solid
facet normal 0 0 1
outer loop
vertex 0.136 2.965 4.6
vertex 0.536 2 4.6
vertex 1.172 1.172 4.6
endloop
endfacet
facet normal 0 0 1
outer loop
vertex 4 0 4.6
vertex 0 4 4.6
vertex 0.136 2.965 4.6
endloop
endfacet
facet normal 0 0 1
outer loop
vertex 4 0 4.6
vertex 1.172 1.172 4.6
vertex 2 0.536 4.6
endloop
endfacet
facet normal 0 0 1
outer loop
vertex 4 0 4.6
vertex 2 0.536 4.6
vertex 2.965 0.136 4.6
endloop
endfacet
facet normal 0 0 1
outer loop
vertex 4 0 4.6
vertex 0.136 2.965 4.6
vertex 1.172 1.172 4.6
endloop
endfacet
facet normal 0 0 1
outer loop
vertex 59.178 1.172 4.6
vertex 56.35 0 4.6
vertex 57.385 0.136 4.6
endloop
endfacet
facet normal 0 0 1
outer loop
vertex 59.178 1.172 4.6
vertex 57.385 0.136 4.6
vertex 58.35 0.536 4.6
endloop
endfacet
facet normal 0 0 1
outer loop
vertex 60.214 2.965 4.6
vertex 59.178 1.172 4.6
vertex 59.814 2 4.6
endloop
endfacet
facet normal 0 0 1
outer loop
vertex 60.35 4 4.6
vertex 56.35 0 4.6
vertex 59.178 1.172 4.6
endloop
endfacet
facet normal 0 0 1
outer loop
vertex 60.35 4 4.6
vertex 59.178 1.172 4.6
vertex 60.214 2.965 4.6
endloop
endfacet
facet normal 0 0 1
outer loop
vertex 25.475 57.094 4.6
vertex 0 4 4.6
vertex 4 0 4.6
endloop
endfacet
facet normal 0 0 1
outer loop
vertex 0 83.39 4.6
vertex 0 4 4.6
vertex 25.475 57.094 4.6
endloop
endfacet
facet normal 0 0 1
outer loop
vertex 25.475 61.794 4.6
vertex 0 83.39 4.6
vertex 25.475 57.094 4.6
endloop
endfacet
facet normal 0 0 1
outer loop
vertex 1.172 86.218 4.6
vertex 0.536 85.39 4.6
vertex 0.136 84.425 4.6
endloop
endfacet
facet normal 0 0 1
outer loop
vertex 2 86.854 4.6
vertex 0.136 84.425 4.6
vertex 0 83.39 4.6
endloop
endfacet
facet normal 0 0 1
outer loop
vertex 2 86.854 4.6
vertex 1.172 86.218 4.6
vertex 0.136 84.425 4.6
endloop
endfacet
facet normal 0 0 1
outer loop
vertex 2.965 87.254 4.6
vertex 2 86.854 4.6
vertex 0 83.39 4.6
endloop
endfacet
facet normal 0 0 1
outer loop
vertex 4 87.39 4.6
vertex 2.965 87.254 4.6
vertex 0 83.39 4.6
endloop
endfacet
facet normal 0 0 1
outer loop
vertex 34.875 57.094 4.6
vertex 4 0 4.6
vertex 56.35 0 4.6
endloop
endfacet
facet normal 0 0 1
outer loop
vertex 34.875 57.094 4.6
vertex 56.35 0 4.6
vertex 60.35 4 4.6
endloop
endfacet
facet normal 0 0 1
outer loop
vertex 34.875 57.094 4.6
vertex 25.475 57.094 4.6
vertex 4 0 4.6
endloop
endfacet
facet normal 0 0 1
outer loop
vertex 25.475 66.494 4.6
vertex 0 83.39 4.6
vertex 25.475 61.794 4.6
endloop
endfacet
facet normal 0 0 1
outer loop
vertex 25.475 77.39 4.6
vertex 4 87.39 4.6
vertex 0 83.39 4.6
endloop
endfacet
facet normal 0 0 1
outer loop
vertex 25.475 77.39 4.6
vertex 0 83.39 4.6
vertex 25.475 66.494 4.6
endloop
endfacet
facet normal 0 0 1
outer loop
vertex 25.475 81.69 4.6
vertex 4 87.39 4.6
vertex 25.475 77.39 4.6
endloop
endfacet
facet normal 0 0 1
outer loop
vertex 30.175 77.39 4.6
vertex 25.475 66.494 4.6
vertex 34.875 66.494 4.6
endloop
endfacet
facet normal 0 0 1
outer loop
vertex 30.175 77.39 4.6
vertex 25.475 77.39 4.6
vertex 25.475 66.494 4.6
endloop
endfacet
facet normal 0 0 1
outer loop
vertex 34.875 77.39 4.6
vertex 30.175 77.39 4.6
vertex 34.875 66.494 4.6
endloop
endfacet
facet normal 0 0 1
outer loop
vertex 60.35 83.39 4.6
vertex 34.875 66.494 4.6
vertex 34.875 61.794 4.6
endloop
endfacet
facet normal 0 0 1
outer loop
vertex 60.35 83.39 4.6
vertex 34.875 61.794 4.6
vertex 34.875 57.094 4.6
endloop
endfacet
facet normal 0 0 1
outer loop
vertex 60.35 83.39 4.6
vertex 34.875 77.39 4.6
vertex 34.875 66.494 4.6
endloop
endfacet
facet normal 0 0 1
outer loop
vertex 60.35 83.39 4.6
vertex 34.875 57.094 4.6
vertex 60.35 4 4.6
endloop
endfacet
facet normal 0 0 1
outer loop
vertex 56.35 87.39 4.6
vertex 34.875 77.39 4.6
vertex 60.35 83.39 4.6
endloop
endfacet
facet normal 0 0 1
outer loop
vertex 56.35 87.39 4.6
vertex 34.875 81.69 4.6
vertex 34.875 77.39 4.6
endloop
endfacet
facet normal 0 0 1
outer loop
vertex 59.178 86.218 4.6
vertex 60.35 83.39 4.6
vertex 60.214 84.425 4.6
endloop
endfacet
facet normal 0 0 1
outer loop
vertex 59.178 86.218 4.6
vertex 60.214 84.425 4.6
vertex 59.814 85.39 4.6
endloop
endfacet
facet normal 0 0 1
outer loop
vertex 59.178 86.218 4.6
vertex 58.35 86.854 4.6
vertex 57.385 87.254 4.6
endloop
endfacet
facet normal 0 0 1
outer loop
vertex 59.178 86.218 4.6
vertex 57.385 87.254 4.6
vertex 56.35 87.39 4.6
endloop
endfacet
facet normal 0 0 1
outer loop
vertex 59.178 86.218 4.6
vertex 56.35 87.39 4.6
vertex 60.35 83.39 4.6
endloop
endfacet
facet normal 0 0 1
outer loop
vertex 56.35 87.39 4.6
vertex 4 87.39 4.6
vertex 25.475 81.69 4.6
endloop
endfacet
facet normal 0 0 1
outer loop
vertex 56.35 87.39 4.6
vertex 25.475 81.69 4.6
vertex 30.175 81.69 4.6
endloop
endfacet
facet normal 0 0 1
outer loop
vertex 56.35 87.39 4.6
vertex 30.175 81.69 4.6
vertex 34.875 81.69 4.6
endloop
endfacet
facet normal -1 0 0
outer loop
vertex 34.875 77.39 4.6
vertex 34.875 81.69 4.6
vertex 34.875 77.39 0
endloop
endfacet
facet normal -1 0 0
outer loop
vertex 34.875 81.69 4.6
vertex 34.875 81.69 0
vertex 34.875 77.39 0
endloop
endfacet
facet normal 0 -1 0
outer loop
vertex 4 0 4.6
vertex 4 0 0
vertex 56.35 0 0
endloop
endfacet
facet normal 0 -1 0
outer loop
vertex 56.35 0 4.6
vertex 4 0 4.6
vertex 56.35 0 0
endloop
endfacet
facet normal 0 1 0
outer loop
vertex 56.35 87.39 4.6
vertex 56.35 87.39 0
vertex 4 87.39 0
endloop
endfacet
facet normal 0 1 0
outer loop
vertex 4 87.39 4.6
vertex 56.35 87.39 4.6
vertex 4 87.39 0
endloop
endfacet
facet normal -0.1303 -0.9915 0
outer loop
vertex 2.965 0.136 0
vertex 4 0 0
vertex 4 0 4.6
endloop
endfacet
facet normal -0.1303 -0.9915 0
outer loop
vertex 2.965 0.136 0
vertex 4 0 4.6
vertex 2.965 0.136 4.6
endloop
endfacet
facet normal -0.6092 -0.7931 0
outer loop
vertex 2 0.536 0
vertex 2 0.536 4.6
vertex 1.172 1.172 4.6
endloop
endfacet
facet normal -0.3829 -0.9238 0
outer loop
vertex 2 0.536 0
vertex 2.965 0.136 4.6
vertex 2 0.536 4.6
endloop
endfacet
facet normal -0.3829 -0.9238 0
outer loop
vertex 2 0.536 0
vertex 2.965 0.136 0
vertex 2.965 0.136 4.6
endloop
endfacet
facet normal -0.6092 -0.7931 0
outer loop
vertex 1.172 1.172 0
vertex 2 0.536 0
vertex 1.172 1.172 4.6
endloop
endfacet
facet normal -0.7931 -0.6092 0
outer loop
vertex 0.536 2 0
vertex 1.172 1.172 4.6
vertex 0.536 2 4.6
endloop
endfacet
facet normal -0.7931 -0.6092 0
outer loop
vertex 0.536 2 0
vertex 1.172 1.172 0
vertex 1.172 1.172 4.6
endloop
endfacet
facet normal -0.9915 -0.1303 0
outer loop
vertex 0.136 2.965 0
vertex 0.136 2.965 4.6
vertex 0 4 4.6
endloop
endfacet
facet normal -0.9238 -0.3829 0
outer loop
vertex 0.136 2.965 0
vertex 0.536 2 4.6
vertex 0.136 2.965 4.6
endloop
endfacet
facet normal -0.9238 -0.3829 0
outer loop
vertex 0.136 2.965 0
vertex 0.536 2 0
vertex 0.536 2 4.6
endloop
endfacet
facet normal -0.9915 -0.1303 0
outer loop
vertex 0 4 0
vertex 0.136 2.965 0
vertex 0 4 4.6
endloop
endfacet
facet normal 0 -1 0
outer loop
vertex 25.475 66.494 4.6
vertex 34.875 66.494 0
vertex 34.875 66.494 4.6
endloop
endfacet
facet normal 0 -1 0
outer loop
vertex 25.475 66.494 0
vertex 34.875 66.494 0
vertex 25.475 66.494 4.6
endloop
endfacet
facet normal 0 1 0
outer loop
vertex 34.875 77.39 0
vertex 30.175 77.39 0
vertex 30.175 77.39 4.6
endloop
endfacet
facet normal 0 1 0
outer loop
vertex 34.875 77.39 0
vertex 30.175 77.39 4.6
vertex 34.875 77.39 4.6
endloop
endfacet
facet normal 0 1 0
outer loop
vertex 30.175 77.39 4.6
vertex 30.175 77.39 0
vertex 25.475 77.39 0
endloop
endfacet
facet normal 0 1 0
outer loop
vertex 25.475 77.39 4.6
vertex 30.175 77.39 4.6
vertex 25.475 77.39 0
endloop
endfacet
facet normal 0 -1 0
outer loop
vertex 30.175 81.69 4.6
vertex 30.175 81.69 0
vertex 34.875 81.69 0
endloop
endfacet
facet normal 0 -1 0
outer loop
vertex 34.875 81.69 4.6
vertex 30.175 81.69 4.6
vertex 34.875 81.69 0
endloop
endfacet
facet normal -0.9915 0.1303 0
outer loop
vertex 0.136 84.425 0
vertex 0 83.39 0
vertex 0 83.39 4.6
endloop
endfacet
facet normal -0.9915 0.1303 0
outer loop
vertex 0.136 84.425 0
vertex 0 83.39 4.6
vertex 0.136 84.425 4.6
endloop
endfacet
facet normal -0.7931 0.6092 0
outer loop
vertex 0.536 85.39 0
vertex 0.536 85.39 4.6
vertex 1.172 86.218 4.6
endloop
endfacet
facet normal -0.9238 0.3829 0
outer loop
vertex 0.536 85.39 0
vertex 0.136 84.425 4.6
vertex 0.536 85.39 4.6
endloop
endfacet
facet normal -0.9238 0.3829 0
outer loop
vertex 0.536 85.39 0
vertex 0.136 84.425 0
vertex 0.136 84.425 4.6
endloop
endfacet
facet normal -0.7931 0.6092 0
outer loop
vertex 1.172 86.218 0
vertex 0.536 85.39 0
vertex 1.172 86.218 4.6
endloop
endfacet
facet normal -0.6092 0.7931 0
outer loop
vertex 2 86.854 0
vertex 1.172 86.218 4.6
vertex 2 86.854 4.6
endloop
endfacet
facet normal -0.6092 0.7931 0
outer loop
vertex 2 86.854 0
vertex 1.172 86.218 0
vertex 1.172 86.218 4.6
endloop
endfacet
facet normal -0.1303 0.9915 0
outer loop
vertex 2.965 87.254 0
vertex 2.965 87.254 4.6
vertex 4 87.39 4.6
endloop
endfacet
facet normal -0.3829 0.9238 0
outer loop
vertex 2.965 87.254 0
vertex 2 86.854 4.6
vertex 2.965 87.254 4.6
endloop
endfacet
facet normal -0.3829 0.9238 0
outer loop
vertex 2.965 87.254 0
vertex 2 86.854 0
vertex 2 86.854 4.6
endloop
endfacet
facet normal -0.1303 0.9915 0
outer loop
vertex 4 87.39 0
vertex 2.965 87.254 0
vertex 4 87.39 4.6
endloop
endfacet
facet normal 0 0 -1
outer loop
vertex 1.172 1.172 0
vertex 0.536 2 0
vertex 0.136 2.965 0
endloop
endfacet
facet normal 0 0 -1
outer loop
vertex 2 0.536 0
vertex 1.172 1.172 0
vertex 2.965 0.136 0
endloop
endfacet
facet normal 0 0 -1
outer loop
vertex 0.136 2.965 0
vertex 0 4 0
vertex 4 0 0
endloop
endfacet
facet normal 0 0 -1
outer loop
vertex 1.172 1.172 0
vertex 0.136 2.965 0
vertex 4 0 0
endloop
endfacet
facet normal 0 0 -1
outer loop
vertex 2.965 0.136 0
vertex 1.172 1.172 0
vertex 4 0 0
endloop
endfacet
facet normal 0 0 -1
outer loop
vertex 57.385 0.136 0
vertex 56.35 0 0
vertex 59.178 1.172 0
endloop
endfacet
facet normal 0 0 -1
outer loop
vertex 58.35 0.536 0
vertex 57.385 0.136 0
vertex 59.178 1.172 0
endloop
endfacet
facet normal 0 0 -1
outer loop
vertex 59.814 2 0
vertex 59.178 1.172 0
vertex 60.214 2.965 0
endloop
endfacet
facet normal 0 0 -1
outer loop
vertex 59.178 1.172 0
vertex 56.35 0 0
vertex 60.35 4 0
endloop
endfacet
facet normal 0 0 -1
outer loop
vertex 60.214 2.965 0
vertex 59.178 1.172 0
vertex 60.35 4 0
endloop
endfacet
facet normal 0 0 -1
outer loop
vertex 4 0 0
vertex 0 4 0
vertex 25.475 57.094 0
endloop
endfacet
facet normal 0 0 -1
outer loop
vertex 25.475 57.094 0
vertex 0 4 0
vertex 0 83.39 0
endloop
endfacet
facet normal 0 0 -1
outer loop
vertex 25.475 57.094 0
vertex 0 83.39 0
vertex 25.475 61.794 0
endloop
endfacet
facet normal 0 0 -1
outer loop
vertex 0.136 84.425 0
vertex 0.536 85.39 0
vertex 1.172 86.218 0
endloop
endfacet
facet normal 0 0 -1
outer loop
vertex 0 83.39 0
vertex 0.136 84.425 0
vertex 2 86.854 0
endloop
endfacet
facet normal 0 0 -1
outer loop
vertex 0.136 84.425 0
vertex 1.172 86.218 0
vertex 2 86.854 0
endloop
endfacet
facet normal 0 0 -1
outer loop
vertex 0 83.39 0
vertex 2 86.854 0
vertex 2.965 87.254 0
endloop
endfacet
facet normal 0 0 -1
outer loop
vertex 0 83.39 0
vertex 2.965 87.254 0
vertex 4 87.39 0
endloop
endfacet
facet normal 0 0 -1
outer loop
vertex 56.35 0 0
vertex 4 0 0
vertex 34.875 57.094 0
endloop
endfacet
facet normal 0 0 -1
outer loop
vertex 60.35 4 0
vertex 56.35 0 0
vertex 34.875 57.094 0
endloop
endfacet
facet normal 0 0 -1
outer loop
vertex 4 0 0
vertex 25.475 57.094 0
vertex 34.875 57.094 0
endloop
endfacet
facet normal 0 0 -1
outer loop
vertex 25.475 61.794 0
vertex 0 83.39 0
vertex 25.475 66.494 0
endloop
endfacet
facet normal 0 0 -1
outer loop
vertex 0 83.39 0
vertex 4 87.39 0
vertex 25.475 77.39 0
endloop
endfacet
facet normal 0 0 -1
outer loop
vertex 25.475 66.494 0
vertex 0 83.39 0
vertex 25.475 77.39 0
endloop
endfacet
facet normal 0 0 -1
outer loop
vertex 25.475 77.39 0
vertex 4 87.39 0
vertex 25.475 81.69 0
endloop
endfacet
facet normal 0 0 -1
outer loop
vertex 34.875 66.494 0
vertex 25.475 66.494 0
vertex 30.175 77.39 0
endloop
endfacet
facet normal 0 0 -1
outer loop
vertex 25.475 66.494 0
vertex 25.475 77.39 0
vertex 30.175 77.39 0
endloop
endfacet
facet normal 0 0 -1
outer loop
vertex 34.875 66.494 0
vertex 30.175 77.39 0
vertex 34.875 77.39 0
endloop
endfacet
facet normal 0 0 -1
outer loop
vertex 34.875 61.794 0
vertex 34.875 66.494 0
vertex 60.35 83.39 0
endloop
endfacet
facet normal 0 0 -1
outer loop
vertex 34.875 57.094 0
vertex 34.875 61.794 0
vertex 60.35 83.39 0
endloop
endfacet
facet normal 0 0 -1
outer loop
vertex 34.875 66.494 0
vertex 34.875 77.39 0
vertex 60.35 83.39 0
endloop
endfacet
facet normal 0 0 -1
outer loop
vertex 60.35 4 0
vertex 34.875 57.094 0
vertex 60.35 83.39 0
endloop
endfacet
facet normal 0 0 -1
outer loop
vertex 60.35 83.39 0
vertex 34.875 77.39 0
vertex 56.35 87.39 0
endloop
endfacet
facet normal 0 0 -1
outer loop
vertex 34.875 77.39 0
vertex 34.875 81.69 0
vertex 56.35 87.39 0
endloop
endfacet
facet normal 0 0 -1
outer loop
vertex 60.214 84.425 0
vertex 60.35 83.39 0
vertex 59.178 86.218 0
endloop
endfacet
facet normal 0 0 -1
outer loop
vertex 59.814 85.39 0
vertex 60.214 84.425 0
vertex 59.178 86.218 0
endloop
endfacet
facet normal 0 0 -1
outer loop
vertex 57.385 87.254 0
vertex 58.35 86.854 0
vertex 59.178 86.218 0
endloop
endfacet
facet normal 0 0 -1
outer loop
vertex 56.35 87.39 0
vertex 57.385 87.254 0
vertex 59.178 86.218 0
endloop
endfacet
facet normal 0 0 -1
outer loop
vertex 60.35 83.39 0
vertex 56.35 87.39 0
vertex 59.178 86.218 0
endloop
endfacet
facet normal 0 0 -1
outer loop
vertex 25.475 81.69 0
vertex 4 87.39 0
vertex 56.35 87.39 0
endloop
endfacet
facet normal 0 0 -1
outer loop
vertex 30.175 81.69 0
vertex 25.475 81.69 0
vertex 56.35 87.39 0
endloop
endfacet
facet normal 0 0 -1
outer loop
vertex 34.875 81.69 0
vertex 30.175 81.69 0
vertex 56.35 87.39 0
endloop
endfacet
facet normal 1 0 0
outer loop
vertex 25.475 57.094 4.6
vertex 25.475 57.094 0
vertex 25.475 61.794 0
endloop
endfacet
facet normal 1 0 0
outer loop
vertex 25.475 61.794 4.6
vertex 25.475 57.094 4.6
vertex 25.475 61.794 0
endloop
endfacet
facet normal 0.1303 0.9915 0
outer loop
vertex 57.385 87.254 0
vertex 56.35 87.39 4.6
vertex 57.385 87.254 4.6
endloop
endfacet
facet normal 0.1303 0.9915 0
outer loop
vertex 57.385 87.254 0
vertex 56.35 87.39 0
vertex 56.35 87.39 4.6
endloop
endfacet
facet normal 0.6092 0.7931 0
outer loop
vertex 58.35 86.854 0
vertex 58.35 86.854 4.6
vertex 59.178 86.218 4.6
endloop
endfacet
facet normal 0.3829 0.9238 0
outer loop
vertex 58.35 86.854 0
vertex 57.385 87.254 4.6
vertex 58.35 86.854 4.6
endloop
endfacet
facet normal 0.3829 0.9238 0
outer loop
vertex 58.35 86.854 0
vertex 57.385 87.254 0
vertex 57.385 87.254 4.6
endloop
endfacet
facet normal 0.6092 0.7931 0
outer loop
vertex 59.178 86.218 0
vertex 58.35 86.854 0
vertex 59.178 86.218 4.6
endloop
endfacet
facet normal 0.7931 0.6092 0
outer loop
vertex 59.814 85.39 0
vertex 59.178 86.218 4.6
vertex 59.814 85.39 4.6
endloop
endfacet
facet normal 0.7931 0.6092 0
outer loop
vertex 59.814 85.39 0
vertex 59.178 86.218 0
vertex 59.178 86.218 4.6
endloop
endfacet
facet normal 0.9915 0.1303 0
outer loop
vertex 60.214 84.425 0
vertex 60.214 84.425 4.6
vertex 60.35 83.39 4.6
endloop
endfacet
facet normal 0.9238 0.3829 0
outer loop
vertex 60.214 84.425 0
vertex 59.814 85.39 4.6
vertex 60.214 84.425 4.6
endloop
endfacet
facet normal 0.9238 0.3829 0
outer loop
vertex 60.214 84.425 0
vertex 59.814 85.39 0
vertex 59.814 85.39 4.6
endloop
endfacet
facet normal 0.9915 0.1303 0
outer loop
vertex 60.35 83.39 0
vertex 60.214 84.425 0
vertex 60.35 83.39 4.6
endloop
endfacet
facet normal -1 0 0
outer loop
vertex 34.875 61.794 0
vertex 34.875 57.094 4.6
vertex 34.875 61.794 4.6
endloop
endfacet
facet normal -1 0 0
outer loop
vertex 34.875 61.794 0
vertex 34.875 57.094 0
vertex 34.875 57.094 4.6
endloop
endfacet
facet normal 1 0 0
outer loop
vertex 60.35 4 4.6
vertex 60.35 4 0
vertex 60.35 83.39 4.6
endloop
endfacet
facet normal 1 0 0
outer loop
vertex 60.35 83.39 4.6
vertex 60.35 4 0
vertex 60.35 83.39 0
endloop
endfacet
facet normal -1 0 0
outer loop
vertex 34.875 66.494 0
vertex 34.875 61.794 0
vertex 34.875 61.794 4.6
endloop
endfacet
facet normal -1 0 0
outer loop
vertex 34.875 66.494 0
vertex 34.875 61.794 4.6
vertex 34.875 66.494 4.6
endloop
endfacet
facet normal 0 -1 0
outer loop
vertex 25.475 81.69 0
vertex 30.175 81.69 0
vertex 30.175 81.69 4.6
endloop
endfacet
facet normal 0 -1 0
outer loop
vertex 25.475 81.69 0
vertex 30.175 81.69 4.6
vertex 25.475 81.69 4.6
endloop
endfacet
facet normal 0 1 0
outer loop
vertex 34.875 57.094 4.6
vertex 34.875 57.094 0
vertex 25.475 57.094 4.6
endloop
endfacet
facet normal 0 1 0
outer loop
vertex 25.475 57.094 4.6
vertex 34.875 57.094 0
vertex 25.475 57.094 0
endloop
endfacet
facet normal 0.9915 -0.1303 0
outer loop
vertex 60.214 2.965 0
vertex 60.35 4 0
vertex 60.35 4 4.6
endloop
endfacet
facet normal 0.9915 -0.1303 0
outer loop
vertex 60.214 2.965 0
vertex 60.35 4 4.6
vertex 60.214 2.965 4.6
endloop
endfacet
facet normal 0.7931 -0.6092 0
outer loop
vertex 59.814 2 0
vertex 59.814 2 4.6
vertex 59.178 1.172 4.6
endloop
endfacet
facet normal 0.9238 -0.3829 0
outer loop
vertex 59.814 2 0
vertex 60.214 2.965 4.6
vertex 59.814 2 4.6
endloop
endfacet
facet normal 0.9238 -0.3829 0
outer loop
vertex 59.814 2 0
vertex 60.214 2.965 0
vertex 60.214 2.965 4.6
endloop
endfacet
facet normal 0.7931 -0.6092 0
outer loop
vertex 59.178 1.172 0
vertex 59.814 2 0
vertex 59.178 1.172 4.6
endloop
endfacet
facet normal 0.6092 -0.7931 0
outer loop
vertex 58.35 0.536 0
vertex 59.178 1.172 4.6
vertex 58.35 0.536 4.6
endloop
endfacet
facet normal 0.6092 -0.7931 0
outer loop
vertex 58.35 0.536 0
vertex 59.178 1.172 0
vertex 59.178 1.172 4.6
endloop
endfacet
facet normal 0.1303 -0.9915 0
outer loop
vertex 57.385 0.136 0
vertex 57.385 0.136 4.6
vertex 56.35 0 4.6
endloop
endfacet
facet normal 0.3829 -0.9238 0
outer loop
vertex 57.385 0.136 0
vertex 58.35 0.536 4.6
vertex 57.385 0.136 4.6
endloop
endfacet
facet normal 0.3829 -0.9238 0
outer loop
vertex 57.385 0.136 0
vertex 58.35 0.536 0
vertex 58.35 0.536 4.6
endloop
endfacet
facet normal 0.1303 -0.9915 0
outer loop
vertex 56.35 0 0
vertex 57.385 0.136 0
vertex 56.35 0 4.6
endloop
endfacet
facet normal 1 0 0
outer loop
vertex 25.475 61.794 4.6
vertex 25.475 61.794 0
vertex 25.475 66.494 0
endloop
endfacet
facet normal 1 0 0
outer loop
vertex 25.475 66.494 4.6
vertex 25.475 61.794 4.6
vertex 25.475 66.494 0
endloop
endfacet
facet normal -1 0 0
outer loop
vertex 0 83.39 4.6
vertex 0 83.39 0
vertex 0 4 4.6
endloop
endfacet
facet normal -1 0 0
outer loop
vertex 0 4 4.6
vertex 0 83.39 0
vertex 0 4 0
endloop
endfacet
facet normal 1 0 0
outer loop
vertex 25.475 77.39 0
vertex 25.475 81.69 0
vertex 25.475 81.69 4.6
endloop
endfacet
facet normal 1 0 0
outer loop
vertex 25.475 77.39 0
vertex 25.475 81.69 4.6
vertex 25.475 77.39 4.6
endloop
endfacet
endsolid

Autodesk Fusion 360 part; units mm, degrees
sketch "Sketch1" plane through (0, 0, 0) normal (0, 0, 1) x (1, 0, 0)
  line L0 (4, 0) -> (56.35, 0)
  line L1 (60.35, 4) -> (60.35, 83.39)
  line L2 (56.35, 87.39) -> (4, 87.39)
  line L3 (0, 83.39) -> (0, 4)
  arc A0 (4, 87.39) -> (0, 83.39) centre (4, 83.39) ccw
  arc A1 (60.35, 83.39) -> (56.35, 87.39) centre (56.35, 83.39) ccw
  arc A2 (56.35, 0) -> (60.35, 4) centre (56.35, 4) ccw
  arc A3 (0, 4) -> (4, 0) centre (4, 4) ccw
  line L4 (30.175, 81.69) -> (25.475, 81.69)
  line L5 (30.175, 81.69) -> (34.875, 81.69)
  line L6 (30.175, 77.39) -> (25.475, 77.39)
  line L7 (30.175, 77.39) -> (34.875, 77.39)
  line L8 (25.475, 81.69) -> (25.475, 77.39)
  line L9 (34.875, 81.69) -> (34.875, 77.39)
  line L10 (34.875, 66.4941) -> (25.475, 66.4941)
  line L11 (34.875, 57.0941) -> (25.475, 57.0941)
  line L12 (34.875, 57.0941) -> (34.875, 61.7941)
  line L13 (34.875, 61.7941) -> (34.875, 66.4941)
  line L14 (25.475, 57.0941) -> (25.475, 61.7941)
  line L15 (25.475, 61.7941) -> (25.475, 66.4941)
  point P0 (60.35, 0)
  point P1 (0, 87.39)
  dimension "d6" = 60.35
  dimension "d7" = 87.39
  dimension "d9" = 4
  dimension "d10" = 4
  dimension "d11" = 4
  dimension "d12" = 4
  dimension "d16" = 4.3
extrude "Extrude2" add sketch "Sketch1" along normal blind 4.6
extrude "Extrude1" [suppressed]
equation "long_side_length = 87.39 mm"
equation "short_side_length = 60.35 mm"
equation "kerf = 0.6 mm"
equation "notch_depth = 10 mm"
equation "thickness = 4.6 mm"
equation "d6 = short_side_length"
equation "d7 = long_side_length"
equation "rounded_edge_length = 4 mm"
equation "d9 = rounded_edge_length"
equation "d10 = rounded_edge_length"
equation "d11 = rounded_edge_length"
equation "d12 = rounded_edge_length"
equation "d16 = thickness - ( kerf / 2 )"
equation "d22 = thickness"
equation "d43 = thickness"
